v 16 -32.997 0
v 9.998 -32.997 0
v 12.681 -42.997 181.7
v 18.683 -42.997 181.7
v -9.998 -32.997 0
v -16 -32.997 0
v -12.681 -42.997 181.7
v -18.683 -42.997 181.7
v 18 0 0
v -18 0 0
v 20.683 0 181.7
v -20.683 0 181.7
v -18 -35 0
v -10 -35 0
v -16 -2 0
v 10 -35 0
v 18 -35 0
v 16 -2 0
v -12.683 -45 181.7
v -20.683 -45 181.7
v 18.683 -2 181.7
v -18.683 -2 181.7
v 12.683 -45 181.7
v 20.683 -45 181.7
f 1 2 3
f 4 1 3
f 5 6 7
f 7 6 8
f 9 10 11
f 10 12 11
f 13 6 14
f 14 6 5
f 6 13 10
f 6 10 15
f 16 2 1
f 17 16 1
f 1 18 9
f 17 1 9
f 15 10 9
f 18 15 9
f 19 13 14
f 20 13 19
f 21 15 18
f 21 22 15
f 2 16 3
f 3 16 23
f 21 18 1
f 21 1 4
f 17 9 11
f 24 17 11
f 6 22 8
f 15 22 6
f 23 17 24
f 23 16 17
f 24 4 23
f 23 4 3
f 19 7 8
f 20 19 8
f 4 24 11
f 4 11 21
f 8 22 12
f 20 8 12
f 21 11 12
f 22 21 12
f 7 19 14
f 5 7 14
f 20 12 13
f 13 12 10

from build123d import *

# Parameters (mm, degrees)
F1_DEPTH      = 50
F3_DEPTH      = 20.6839429735
F3_DEPTH_BACK = 20.6839429735
F4_T          = -2
F6_DEPTH      = 25


with BuildPart() as f1:
    # F0 (on Front) → F1 (new body)
    with BuildSketch(Plane.XZ):
        Polygon((-20.175, 147.3), (-18, 0), (0, 0), (0, 147.3), align=None)
        Polygon((0, 147.3), (0, 0), (18, 0), (20.175, 147.3), align=None)
        Polygon((0, 181.7), (0, 147.3), (20.175, 147.3), (20.6829429735, 181.7), align=None)
        Polygon((-20.6829429735, 181.7), (-20.175, 147.3), (0, 147.3), (0, 181.7), align=None)
    extrude(amount=F1_DEPTH)

    # F2 (on Right) → F3 (cut, two sides)
    with BuildSketch(Plane.YZ) as f3_sk:
        Polygon((-45, 181.7), (-50, 181.7), (-50, 0), (-35, 0), align=None)
    extrude(amount=-F3_DEPTH, mode=Mode.SUBTRACT)
    extrude(f3_sk.sketch, amount=F3_DEPTH_BACK, mode=Mode.SUBTRACT)

    # F4
    f4_openings = [f1.faces().sort_by_distance(p)[0] for p in [
        (0, -22.5, 181.7),
        (0, -17.5, 0),
    ]]
    offset(amount=F4_T, openings=f4_openings)

    # F5 (on face) → F6 (cut)
    with BuildSketch(Plane(origin=(0, -34.8943073645, -1.9204351879), x_dir=(1, 0, 0), z_dir=(0, -0.9984889636, -0.0549526122))):
        Polygon((12.6829429735, 183.8983122333), (-12.6829429735, 183.8983122333), (-10, 1.9233414268), (10, 1.9233414268), align=None)
        Polygon((10, 1.9233414268), (-10, 1.9233414268), (-9.9168600221, -3.7157627956), (9.9168600221, -3.7157627956), align=None)
    extrude(amount=-F6_DEPTH, mode=Mode.SUBTRACT)


solid = f1.part
